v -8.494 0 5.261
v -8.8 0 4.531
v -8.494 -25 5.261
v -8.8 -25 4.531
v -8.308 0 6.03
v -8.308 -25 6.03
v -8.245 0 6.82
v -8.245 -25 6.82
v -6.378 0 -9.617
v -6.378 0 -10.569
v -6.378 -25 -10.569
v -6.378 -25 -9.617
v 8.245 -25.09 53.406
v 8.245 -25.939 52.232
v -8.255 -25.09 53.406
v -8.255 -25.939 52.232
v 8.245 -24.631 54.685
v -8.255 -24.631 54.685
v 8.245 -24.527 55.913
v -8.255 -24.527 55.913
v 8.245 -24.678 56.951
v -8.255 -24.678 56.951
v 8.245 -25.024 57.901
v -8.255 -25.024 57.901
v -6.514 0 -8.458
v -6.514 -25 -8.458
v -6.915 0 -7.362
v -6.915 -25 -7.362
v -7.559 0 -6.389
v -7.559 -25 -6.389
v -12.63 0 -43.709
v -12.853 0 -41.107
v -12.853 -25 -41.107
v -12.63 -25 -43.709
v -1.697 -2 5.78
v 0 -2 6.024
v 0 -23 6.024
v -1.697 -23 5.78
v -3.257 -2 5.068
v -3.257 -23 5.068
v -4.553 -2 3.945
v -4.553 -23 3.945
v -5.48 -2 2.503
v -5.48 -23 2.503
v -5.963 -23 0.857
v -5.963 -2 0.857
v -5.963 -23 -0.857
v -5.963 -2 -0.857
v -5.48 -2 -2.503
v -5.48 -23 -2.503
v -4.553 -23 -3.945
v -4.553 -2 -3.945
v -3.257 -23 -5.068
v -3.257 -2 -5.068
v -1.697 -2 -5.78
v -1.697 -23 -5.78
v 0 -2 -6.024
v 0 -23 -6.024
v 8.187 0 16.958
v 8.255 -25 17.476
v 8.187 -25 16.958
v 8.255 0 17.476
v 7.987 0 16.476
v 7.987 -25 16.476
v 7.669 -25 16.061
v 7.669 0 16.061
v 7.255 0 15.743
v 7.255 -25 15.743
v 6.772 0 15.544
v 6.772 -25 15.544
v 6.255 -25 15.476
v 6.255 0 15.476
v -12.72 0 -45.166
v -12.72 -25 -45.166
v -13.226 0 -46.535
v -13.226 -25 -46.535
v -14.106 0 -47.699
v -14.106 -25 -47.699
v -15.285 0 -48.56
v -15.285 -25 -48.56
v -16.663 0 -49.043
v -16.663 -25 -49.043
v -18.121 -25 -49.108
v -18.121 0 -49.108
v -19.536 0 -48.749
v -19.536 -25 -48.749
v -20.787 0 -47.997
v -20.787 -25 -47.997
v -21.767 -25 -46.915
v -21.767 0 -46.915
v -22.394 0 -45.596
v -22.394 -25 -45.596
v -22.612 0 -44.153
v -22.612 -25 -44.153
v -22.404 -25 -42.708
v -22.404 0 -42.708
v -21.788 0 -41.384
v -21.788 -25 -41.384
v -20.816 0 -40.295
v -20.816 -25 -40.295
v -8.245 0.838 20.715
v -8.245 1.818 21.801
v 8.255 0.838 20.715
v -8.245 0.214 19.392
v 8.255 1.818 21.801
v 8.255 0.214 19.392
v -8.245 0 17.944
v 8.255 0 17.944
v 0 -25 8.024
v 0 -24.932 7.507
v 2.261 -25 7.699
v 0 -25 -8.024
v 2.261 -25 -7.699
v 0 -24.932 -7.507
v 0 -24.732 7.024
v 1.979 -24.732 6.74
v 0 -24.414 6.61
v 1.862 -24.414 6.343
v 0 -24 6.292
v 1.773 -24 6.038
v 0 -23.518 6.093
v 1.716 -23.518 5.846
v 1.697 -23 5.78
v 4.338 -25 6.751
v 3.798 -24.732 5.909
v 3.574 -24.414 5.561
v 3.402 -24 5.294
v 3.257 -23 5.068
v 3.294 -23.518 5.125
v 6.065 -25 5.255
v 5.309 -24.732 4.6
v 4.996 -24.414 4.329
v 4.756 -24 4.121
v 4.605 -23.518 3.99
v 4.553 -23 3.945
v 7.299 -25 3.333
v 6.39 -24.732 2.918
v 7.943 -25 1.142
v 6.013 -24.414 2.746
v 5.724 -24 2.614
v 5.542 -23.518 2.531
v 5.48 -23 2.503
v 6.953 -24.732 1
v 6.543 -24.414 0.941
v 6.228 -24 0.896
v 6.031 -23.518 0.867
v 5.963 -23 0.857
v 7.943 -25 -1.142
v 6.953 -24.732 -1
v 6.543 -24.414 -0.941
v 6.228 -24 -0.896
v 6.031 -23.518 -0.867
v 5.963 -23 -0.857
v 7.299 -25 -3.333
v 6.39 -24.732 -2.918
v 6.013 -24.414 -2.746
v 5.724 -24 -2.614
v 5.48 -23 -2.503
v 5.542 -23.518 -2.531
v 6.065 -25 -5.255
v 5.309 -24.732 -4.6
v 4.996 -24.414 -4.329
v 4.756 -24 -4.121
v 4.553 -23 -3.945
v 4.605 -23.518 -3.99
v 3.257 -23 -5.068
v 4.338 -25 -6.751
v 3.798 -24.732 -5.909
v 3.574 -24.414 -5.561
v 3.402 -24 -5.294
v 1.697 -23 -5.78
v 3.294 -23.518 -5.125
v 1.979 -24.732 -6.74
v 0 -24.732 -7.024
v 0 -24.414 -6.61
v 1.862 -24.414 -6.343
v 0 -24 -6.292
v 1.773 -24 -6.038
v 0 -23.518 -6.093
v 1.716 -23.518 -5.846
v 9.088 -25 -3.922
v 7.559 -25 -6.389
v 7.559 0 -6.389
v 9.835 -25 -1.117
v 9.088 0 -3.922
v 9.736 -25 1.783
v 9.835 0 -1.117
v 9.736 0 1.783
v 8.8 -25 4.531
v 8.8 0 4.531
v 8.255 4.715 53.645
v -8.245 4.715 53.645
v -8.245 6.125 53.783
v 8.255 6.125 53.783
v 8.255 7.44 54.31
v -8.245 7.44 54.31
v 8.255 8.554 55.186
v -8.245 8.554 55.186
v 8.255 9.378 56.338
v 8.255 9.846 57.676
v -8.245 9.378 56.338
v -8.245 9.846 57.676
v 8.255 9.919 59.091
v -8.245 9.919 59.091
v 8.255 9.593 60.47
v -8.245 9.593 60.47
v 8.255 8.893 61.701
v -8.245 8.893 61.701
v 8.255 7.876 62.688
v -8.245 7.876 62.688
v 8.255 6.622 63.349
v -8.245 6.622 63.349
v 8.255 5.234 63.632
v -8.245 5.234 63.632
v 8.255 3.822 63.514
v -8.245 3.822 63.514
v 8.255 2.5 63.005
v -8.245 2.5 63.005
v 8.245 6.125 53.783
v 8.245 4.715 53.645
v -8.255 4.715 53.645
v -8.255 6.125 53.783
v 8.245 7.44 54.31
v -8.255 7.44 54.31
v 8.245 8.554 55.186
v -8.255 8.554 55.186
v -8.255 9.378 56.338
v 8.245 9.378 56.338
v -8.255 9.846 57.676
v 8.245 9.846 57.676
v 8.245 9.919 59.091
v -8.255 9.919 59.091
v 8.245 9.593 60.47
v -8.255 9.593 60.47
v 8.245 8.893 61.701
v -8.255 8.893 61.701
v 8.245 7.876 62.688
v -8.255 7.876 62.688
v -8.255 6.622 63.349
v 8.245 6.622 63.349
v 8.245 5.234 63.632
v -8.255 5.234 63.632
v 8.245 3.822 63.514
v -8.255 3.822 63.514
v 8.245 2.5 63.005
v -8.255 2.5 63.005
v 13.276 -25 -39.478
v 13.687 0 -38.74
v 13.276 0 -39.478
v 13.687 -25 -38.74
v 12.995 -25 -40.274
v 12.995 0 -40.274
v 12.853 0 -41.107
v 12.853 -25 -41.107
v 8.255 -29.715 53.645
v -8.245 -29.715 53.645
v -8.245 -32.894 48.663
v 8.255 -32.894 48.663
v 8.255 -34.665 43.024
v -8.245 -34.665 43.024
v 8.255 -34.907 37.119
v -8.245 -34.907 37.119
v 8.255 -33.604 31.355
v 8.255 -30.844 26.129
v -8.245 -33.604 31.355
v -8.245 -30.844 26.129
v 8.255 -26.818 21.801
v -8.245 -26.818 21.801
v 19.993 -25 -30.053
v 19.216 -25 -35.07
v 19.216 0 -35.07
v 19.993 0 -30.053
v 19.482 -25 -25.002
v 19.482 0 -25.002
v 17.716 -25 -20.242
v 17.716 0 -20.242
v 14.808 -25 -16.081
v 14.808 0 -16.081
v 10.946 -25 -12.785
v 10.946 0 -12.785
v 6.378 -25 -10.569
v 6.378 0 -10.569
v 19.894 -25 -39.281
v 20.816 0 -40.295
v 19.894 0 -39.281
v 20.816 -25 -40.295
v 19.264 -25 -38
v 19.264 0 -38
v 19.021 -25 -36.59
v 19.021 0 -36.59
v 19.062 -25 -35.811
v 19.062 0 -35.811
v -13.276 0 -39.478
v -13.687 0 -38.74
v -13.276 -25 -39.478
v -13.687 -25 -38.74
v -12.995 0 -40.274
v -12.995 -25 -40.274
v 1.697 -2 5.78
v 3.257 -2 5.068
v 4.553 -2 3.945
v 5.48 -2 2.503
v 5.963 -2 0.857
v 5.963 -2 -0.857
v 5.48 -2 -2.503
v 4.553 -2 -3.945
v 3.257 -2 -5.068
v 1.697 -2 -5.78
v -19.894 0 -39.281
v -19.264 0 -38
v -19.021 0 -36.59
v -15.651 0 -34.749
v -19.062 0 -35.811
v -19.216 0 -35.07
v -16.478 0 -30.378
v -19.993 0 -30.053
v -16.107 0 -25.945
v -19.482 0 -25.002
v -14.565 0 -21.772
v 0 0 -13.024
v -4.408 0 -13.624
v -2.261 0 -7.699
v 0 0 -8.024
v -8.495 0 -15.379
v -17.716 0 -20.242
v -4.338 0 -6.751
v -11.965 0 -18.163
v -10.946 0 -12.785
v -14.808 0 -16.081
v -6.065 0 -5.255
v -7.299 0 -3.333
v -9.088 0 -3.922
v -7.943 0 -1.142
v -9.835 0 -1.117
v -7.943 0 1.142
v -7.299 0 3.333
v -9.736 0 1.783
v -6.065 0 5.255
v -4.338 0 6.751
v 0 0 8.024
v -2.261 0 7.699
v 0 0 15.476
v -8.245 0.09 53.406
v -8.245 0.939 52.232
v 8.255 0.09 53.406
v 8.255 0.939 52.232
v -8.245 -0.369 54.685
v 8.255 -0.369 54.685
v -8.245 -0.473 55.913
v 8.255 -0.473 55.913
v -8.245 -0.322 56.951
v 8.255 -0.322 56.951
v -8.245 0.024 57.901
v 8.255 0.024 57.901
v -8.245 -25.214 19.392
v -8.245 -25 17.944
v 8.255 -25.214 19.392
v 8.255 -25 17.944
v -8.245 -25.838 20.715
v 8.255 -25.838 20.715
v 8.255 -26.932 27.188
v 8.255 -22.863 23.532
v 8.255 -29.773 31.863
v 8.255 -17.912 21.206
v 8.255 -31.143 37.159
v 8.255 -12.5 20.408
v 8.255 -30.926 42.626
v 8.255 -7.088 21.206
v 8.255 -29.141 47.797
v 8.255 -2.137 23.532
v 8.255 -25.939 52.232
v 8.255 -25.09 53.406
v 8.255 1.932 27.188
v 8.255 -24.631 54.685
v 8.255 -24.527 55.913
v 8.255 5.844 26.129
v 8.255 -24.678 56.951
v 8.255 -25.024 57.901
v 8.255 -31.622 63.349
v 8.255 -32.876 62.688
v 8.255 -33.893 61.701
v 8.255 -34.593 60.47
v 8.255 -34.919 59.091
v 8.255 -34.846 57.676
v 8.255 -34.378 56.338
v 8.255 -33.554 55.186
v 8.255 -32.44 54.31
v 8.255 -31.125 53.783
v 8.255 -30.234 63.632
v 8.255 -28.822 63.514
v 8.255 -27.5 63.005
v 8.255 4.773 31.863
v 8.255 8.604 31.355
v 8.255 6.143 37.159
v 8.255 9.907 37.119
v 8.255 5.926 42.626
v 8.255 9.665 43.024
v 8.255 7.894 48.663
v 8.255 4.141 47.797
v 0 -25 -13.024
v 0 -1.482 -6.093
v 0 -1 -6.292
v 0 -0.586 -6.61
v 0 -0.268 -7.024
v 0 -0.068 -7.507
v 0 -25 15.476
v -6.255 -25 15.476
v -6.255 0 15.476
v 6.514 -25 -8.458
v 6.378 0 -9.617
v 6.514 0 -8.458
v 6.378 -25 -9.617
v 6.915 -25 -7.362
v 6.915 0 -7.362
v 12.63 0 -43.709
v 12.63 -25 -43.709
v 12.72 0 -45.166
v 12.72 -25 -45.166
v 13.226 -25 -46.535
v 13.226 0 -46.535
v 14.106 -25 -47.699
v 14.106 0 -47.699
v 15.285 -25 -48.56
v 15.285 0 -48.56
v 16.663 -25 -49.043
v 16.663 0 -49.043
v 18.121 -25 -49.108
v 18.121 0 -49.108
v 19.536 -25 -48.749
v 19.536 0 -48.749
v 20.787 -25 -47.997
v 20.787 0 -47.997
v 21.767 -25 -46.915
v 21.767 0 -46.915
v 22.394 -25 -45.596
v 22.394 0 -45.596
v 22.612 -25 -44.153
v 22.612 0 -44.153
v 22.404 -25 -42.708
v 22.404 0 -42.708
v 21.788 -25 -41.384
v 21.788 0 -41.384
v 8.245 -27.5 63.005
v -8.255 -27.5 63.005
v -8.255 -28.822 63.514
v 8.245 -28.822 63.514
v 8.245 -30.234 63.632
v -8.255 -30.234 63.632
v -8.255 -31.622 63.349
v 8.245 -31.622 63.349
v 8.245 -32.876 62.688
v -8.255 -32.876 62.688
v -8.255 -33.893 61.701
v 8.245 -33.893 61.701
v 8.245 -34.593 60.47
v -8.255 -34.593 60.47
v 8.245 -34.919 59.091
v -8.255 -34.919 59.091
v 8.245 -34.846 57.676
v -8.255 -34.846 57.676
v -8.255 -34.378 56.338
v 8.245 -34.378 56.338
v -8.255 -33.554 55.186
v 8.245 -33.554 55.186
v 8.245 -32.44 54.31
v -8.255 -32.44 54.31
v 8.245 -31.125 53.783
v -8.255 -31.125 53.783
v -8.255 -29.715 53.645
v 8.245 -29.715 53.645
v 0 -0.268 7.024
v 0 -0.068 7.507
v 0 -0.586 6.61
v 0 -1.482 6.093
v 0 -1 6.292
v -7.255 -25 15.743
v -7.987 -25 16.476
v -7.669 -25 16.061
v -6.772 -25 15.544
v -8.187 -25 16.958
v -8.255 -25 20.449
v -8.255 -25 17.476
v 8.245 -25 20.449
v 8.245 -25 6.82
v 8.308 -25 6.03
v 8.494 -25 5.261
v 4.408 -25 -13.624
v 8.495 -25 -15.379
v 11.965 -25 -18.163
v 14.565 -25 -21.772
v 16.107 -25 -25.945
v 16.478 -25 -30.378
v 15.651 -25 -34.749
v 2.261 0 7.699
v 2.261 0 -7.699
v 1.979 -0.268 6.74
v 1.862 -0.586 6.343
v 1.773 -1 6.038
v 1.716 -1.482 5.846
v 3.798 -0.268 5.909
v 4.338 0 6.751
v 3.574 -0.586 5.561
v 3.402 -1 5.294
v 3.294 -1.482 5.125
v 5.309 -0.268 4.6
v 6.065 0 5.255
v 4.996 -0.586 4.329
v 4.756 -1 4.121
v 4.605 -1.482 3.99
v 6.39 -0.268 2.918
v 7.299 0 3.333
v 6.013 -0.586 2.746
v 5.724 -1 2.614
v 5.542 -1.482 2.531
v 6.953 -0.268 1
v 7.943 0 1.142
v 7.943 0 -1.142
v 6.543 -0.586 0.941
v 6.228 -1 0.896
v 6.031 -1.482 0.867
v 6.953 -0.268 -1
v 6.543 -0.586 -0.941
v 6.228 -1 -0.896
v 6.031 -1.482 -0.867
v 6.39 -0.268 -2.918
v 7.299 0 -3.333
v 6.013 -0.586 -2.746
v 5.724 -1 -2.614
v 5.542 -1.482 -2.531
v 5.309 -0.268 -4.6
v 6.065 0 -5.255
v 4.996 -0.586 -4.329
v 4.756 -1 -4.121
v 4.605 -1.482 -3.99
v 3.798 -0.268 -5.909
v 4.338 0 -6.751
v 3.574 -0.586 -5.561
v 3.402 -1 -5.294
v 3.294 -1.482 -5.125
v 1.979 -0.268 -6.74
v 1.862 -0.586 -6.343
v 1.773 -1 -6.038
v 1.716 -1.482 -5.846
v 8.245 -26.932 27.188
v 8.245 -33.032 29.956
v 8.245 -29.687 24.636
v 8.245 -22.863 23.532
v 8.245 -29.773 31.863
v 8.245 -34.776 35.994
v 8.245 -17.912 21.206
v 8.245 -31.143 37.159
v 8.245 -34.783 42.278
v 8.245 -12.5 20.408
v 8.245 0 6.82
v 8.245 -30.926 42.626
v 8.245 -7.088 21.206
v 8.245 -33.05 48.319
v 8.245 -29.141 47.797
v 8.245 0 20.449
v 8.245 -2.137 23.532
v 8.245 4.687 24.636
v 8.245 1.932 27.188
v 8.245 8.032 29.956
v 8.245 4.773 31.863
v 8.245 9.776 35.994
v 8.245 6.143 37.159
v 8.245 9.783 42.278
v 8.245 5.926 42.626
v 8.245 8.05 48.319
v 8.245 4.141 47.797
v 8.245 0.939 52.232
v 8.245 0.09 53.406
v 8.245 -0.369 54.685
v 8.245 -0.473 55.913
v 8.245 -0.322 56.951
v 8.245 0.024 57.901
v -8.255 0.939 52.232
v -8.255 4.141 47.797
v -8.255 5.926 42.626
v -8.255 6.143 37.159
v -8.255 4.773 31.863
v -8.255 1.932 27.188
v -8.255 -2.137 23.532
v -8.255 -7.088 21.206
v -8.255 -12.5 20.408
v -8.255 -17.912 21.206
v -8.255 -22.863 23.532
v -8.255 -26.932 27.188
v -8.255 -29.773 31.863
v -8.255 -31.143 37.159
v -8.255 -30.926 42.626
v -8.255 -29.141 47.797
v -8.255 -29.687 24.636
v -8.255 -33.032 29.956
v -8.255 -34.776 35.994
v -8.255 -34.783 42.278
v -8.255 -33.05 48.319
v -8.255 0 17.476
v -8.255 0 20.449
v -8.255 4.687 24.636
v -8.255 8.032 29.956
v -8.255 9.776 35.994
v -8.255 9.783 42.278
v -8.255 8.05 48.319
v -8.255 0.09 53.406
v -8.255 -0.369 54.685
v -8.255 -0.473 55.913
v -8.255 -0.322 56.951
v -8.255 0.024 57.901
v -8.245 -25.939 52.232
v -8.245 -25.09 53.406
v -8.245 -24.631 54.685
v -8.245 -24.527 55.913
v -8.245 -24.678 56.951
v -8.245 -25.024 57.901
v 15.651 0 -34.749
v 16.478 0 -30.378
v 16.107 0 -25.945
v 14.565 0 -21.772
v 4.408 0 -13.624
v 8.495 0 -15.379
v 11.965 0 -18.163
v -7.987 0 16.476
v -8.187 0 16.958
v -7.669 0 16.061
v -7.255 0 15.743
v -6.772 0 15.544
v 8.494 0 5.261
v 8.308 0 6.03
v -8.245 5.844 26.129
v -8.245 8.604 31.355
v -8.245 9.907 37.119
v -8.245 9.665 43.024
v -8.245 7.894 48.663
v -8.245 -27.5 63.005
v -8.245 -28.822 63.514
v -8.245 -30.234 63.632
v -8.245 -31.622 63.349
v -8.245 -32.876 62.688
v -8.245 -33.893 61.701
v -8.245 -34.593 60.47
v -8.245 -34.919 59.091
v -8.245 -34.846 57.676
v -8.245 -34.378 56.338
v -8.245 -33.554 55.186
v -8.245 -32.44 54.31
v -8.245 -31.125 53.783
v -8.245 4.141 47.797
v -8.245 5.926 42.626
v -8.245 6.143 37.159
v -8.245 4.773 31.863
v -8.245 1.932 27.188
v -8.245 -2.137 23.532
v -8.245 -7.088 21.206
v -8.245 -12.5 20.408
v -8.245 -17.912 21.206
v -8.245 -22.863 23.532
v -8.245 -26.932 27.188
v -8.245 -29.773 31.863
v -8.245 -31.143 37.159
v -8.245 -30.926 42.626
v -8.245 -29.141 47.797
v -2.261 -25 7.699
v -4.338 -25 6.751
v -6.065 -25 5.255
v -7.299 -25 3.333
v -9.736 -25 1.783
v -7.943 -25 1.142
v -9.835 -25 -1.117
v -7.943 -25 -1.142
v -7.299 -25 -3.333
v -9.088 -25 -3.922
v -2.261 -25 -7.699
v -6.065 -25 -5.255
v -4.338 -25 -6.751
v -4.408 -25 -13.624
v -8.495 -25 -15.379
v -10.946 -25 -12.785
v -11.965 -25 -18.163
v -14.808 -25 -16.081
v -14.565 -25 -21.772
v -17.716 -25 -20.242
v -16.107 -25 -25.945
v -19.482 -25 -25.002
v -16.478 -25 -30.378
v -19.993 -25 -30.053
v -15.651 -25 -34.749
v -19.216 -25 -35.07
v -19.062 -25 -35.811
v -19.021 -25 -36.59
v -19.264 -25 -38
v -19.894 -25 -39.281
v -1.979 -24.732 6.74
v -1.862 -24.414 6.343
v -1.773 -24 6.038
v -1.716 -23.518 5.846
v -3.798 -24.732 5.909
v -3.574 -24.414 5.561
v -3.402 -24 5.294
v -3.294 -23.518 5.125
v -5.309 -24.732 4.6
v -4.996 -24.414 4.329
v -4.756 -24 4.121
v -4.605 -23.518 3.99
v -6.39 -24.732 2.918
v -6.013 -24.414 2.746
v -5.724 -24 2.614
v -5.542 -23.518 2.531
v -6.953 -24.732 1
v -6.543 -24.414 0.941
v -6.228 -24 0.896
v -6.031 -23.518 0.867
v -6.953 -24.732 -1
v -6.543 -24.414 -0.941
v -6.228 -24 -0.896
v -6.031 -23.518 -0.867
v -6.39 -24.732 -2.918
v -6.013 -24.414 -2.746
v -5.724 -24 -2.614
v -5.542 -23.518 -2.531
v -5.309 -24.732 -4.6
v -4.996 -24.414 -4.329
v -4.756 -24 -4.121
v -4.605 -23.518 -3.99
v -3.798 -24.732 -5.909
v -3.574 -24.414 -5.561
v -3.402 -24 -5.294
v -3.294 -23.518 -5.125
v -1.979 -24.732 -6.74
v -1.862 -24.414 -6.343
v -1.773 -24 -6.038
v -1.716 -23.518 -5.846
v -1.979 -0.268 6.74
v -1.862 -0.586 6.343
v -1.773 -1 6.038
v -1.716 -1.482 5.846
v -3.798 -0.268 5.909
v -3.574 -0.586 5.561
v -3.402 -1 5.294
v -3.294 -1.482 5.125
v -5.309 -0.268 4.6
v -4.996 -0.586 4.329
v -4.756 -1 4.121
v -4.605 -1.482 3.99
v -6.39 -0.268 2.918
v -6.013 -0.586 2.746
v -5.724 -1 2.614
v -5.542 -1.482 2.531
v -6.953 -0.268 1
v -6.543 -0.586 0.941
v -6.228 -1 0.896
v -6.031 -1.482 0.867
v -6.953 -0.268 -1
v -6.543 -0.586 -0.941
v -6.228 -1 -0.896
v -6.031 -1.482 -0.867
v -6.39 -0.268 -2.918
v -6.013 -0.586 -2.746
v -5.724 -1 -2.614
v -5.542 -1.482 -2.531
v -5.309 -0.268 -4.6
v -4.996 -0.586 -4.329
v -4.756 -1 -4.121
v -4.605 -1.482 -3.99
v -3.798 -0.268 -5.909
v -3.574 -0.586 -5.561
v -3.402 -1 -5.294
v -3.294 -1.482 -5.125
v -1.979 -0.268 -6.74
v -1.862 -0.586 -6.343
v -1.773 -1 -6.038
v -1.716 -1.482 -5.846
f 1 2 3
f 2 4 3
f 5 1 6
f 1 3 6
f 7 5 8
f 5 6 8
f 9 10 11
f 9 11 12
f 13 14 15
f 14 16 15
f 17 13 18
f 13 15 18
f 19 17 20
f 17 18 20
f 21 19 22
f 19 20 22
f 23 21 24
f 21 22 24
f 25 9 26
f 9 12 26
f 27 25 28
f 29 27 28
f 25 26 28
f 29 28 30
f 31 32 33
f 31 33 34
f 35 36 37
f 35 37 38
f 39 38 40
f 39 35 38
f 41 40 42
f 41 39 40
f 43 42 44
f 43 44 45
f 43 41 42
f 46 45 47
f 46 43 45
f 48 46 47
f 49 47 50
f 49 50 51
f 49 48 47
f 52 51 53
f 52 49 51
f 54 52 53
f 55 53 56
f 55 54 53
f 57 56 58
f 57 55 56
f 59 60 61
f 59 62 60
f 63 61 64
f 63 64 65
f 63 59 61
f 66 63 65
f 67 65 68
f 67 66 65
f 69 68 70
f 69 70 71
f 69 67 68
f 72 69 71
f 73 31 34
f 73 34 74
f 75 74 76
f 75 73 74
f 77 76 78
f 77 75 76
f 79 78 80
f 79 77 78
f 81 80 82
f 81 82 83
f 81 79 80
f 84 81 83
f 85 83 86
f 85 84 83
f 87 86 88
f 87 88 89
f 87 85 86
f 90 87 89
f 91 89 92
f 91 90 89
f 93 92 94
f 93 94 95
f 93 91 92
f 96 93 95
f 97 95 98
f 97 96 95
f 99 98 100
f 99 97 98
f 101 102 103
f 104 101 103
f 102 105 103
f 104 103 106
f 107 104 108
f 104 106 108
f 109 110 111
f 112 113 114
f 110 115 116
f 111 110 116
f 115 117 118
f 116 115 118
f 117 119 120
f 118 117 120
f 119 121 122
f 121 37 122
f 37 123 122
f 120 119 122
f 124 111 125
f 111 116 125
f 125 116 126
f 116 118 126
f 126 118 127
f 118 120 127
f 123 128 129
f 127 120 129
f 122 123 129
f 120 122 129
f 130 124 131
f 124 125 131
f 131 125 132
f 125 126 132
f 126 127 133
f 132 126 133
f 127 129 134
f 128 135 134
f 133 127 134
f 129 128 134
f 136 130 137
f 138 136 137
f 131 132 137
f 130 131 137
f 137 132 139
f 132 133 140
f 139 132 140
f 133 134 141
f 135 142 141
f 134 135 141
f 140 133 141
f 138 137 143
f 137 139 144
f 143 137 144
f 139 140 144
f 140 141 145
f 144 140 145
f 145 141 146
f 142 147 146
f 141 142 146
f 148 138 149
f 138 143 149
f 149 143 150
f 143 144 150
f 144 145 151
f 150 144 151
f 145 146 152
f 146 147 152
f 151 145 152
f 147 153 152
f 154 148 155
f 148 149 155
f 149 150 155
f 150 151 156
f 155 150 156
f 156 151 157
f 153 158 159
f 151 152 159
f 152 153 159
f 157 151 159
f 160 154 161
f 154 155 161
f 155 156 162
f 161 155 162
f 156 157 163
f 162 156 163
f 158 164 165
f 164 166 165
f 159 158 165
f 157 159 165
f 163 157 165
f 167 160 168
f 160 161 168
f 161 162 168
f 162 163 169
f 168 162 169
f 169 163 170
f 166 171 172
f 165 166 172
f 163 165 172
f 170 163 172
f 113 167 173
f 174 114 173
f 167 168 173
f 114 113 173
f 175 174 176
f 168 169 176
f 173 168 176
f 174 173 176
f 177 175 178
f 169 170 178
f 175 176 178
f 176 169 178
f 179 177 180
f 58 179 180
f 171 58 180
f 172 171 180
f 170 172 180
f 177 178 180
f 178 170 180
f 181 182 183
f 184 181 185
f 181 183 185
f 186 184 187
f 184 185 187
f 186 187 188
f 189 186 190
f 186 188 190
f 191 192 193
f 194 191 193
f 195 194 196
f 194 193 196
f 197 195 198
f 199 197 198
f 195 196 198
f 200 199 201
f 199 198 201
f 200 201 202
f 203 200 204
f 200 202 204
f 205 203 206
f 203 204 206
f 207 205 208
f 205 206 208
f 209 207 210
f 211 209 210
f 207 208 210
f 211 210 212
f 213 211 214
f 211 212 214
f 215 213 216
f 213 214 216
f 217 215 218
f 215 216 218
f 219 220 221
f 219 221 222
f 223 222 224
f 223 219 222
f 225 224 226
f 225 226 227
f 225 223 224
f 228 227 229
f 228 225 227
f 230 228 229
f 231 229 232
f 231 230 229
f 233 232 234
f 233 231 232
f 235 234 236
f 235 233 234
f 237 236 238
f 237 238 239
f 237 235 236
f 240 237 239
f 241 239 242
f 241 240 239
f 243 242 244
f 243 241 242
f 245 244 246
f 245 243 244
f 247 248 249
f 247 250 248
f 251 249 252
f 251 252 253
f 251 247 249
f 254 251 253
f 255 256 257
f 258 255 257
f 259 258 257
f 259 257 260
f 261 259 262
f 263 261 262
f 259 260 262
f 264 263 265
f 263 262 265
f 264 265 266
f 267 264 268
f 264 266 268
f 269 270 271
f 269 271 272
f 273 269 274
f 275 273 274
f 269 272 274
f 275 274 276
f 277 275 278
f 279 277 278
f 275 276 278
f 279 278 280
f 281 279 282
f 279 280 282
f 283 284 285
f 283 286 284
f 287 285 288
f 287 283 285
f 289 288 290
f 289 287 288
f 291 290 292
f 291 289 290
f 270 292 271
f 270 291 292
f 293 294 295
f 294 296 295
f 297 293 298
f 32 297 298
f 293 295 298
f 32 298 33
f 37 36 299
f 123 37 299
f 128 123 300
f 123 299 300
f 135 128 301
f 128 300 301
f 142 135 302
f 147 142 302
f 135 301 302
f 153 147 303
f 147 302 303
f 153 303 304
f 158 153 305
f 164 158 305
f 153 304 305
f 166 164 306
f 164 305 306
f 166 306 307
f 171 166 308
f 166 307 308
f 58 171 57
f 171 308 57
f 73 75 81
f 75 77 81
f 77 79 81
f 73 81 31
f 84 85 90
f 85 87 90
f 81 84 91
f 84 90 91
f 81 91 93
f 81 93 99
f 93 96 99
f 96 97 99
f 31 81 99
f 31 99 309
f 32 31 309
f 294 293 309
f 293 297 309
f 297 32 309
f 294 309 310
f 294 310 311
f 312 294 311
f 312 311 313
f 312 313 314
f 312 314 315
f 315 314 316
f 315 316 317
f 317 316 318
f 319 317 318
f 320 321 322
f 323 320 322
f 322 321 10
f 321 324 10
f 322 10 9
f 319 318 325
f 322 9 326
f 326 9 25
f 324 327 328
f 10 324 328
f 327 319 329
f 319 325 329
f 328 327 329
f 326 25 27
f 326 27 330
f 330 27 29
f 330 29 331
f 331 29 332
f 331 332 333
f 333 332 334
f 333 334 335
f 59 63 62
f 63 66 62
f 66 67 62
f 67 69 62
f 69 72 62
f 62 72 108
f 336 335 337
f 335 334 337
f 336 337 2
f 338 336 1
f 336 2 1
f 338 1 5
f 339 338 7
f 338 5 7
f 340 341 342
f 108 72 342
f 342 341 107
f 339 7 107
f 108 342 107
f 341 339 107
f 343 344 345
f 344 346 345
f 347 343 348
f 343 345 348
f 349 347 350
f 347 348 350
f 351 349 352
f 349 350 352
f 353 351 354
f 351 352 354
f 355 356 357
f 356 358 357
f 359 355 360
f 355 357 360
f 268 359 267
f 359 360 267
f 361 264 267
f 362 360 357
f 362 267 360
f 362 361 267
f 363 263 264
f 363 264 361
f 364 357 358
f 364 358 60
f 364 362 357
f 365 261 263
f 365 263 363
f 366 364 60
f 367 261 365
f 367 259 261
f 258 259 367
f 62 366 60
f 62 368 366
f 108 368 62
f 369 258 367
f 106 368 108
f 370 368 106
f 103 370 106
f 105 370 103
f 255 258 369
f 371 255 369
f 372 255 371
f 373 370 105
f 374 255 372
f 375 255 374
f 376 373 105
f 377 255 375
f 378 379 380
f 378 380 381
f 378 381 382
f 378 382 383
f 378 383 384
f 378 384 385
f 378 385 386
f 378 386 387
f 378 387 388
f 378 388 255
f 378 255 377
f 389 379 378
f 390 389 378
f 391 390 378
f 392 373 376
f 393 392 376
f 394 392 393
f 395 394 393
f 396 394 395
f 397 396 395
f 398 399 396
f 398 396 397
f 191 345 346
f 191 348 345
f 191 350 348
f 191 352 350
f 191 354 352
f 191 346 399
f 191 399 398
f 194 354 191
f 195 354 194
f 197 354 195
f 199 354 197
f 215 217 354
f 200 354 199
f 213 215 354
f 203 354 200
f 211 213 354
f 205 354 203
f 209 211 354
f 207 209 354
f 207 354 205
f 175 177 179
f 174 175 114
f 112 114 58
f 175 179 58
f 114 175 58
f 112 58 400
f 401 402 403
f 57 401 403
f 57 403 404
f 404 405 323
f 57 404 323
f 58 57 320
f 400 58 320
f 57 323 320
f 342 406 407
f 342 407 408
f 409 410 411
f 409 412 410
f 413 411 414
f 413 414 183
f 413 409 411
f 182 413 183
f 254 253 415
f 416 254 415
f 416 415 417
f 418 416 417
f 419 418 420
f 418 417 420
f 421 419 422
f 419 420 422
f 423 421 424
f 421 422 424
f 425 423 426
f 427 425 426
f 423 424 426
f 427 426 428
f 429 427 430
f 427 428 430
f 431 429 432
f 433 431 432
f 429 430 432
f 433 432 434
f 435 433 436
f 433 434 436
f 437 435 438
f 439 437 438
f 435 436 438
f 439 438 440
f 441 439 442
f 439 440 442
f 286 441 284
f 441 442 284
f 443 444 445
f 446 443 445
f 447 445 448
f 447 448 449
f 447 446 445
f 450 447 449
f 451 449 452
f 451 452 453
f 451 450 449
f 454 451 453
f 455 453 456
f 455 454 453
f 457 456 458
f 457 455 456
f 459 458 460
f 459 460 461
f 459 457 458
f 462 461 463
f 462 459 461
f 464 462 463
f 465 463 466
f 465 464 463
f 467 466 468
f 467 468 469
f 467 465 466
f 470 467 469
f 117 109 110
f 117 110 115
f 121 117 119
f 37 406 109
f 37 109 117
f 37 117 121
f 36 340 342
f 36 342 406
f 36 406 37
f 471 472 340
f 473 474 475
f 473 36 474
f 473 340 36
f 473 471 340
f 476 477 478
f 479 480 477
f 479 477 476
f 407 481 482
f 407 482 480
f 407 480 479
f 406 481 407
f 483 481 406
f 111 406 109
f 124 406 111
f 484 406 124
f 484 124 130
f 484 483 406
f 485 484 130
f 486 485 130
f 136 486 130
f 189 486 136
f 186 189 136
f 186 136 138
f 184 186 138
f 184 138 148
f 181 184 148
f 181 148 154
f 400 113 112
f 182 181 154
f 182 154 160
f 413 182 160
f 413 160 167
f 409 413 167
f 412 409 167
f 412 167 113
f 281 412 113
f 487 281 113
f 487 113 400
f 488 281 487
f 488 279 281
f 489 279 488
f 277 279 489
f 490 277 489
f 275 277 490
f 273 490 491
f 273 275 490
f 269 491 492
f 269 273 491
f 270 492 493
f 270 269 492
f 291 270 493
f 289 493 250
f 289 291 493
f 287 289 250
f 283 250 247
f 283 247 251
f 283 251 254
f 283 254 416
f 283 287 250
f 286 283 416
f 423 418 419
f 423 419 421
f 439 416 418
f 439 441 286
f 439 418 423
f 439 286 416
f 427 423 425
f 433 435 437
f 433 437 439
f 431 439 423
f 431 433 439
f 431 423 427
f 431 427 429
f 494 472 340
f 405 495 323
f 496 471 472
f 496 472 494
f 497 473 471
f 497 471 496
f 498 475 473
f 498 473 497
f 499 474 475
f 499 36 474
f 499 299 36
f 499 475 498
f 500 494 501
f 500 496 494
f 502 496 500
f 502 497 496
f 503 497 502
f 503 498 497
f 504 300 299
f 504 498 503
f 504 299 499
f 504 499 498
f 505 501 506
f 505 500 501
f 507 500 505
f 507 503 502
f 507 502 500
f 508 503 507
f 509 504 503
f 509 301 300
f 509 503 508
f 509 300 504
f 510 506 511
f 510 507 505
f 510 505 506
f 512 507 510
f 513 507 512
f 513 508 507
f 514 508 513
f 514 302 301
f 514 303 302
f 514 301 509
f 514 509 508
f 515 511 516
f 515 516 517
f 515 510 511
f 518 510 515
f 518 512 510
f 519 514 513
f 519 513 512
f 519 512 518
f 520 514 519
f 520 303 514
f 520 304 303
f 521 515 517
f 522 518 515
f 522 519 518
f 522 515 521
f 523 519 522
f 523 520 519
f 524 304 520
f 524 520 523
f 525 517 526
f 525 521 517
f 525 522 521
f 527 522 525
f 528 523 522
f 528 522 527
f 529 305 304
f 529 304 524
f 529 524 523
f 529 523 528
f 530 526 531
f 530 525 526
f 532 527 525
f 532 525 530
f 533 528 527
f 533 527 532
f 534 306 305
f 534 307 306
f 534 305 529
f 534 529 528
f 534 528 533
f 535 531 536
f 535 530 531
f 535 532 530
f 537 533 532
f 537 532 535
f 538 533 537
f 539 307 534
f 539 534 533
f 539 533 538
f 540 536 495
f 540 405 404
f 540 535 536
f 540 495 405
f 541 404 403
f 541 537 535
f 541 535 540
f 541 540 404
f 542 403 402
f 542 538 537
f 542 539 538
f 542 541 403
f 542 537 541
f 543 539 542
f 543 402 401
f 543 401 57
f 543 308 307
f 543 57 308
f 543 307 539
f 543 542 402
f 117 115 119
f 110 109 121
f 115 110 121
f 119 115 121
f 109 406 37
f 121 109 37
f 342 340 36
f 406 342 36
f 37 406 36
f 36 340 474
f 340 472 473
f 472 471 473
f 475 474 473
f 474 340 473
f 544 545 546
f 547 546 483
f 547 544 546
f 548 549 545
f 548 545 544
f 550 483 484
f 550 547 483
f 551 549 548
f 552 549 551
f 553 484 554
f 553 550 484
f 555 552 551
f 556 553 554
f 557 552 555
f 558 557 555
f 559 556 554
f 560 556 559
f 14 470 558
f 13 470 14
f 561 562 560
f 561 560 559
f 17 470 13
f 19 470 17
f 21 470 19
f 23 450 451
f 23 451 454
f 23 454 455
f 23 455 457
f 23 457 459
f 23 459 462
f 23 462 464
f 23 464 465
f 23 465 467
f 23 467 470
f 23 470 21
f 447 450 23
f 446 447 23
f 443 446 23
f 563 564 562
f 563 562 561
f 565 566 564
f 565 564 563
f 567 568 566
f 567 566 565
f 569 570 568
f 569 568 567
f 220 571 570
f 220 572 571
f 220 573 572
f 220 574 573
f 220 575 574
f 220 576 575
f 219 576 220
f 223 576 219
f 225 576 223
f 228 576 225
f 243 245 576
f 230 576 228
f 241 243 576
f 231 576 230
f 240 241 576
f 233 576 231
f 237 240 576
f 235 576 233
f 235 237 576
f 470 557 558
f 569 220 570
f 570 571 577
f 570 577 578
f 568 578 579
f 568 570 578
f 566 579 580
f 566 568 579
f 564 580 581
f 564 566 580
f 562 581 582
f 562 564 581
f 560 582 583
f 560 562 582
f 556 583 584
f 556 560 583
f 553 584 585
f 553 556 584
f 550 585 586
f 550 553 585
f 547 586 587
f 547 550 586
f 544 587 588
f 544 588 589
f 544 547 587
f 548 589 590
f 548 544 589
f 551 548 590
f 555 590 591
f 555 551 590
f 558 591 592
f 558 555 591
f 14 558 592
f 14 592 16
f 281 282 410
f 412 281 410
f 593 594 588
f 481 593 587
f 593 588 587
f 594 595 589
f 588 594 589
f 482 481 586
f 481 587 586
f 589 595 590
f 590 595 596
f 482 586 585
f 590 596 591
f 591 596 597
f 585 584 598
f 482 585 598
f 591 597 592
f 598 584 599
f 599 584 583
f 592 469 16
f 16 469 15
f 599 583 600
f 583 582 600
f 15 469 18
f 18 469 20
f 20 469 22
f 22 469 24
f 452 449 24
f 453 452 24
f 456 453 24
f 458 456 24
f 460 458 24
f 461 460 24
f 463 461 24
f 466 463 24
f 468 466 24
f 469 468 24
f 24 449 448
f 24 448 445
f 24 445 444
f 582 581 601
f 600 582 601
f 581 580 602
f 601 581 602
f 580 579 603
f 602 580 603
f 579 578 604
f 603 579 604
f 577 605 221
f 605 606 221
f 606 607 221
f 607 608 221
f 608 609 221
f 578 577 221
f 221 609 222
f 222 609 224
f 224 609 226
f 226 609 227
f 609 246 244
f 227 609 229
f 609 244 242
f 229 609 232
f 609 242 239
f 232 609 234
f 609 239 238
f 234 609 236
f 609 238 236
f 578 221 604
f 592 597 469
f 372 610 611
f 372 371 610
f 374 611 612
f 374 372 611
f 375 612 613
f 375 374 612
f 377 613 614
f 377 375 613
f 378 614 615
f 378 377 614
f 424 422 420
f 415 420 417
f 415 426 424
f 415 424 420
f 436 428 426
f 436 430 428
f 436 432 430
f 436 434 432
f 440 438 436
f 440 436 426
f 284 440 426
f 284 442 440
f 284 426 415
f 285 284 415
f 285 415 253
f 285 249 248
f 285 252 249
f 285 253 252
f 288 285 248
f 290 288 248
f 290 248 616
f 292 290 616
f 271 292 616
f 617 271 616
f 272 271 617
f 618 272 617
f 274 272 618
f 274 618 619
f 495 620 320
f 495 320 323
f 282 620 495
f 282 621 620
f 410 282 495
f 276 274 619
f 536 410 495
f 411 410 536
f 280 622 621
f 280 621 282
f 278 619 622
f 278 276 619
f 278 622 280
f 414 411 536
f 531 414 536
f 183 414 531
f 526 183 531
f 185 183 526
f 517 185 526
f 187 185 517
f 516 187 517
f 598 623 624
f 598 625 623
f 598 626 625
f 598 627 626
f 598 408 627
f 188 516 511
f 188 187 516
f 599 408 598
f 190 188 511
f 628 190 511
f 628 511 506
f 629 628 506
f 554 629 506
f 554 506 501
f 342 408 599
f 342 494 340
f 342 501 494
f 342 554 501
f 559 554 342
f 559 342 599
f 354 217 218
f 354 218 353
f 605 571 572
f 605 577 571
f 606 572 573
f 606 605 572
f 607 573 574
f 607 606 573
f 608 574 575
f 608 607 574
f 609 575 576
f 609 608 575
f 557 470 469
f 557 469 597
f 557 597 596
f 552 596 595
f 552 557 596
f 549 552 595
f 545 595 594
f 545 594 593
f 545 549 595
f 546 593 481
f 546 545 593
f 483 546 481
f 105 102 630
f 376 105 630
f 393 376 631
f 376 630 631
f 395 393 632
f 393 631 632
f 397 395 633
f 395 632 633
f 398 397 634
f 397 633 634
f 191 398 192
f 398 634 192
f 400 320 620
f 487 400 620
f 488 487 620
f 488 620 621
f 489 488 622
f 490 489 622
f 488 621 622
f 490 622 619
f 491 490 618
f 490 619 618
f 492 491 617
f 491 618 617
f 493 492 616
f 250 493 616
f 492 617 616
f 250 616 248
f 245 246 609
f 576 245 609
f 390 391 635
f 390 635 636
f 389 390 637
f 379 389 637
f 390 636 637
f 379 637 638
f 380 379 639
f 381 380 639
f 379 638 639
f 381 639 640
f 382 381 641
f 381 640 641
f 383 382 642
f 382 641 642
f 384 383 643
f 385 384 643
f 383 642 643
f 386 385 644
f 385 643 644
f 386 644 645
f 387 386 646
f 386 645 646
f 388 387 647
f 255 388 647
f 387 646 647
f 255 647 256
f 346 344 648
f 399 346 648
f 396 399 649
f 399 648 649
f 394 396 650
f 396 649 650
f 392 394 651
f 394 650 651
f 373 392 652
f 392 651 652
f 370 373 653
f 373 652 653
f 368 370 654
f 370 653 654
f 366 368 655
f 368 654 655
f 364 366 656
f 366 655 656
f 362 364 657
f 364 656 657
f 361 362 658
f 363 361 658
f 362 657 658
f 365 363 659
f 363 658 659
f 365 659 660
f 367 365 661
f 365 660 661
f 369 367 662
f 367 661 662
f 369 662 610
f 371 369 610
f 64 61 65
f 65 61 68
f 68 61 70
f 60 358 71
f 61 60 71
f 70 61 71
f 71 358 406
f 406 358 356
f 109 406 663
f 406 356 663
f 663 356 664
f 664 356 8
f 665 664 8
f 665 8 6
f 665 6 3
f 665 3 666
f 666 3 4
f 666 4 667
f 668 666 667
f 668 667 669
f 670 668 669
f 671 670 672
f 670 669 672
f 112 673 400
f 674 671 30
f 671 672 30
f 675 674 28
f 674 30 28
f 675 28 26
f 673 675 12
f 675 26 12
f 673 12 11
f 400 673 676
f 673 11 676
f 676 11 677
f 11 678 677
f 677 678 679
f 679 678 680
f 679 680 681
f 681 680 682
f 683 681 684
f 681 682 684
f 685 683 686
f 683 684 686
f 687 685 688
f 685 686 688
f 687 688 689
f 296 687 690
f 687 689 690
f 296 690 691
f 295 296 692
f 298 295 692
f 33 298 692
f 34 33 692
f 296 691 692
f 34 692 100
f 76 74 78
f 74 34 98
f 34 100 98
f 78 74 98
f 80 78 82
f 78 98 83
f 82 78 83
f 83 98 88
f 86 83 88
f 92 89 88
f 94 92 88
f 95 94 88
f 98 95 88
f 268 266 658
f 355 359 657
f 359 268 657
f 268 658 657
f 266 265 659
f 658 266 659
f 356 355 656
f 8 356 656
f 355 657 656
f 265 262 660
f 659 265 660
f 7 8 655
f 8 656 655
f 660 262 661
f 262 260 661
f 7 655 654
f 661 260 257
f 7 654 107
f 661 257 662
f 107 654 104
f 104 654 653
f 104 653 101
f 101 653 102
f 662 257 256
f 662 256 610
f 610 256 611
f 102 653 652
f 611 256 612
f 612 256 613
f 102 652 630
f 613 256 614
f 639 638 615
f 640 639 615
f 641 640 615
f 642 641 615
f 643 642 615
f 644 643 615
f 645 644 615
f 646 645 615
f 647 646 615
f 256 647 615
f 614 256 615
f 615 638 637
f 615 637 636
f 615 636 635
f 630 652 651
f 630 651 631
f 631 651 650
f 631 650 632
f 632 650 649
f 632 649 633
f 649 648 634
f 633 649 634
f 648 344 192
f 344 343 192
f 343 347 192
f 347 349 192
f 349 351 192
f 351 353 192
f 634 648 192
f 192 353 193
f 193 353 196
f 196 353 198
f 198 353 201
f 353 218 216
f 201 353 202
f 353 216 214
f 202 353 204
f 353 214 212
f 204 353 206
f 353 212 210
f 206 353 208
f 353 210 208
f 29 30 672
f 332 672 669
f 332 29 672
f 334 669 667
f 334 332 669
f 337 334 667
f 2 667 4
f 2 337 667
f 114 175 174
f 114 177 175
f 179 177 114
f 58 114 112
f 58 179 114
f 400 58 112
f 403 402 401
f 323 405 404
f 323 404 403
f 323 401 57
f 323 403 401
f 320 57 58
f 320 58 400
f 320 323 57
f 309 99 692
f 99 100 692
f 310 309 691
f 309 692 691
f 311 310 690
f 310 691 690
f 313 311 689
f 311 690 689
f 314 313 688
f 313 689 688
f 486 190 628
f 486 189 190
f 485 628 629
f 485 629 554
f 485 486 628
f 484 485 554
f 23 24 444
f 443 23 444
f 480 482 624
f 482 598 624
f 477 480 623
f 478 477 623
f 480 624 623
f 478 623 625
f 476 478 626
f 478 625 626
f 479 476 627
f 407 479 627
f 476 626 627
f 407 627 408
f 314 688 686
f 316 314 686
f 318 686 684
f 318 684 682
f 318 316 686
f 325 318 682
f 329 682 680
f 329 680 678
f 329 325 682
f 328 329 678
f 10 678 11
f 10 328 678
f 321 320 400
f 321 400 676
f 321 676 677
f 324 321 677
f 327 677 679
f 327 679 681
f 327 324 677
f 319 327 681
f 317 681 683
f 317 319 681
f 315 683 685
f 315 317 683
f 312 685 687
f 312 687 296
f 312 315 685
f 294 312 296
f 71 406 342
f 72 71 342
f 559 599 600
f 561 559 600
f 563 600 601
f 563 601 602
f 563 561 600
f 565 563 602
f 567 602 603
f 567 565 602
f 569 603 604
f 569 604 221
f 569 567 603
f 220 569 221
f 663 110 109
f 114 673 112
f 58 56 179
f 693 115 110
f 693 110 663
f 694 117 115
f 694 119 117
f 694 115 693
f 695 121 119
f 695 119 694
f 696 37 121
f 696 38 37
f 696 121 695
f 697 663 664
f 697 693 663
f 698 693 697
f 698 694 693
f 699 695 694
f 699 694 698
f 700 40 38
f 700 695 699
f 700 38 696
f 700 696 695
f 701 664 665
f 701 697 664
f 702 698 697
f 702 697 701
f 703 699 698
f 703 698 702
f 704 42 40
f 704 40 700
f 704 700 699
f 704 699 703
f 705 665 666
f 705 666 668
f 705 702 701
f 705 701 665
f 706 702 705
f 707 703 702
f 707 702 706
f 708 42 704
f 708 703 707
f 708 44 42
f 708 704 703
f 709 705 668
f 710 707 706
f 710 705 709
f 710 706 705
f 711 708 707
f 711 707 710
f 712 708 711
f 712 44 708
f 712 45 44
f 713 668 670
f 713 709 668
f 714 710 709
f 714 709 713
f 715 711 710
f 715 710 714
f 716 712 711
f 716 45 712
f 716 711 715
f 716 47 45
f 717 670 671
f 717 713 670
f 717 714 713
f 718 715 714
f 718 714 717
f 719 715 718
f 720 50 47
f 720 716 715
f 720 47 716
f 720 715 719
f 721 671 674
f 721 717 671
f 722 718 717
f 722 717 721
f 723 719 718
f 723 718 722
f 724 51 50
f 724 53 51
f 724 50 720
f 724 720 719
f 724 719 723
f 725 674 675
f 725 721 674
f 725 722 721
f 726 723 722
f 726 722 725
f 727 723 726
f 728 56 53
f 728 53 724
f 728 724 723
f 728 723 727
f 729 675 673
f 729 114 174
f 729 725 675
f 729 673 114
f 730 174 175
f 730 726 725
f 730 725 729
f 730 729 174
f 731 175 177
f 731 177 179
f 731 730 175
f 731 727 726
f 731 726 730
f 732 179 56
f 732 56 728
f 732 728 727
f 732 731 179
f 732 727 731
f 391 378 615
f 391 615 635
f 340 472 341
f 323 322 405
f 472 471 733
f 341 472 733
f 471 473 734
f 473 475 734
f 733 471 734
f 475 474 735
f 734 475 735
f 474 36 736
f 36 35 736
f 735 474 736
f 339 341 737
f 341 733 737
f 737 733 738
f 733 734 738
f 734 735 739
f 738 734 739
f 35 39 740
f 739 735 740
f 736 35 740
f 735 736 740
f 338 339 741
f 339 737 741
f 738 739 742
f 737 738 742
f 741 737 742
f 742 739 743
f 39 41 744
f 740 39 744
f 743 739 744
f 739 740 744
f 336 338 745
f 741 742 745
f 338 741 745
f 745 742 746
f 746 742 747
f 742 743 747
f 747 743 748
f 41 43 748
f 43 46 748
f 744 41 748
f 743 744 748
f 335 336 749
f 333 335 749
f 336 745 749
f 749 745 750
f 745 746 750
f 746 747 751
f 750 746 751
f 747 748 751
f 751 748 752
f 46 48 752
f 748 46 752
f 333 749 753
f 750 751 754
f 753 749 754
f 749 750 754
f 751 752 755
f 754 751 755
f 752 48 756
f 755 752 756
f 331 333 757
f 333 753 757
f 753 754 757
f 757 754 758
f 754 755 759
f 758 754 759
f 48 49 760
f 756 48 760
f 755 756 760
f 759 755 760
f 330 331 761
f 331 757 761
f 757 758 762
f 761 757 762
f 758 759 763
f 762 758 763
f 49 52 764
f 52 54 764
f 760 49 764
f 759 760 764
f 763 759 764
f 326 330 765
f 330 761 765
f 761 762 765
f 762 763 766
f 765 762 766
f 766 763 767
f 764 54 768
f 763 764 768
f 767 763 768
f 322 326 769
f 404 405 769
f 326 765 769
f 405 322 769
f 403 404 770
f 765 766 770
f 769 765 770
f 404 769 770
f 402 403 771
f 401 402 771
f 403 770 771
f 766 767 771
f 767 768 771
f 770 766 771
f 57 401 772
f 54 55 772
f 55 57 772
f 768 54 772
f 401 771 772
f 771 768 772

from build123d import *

# Parameters (mm, degrees)
F1_DEPTH = 25
F3_DEPTH = 16.5
F5_R     = 5
F5_2_R   = 5
F6_R     = 2
F6_2_R   = 2


with BuildPart() as f1:
    # F0 (on Front) → F1 (new body)
    with BuildSketch(Plane.XZ):
        with BuildLine():
            ThreePointArc((0, -13.0244963626), (14.841258851, -22.3142927791), (12.9707270003, -39.7230374879))
            Line((12.9707270003, -39.7230374879), (12.6301857194, -43.7085150799))
            ThreePointArc((12.6301857194, -43.7085150799), (21.0202444261, -47.7926193342), (17.539775381, -39.1347138203))
            ThreePointArc((17.539775381, -39.1347138203), (18.6284646808, -22.2457393509), (6.3781159631, -10.5687680263))
            Line((6.3781159631, -10.5687680263), (6.3781159631, -7.5687680263))
            ThreePointArc((6.3781159631, -7.5687680263), (9.7979360751, -1.4025196408), (8.2453303507, 5.4755036374))
            Line((8.2453303507, 5.4755036374), (8.2453303507, 15.4755036374))
            Line((8.2453303507, 15.4755036374), (0, 15.4755036374))
            Line((0, 15.4755036374), (0, 6.0244963626))
            ThreePointArc((0, 6.0244963626), (6.0244963626, 0), (0, -6.0244963626))
            Line((0, -6.0244963626), (0, -13.0244963626))
        make_face()
    extrude(amount=F1_DEPTH)

    # F2 (on face) → F3 (join)
    with BuildSketch(Plane.YZ.offset(8.2453303507)):
        with BuildLine():
            ThreePointArc((-1.6496046584, 54.4491597502), (-12.5, 20.4076123815), (-23.3503953416, 54.4491597502))
            Line((-23.3503953416, 54.4491597502), (-25.001859694, 57.8541294423))
            Line((-25.001859694, 57.8541294423), (-25.0057154727, 57.8620792414))
            Line((-25.0057154727, 57.8620792414), (-27.5, 63.0047656136))
            ThreePointArc((-27.5, 63.0047656136), (-34.8052642949, 59.7918207884), (-29.7149281613, 53.6454089151))
            ThreePointArc((-29.7149281613, 53.6454089151), (-34.7764276378, 35.993632025), (-25, 20.4493254476))
            Line((-25, 20.4493254476), (-25, 15.4755036374))
            Line((-25, 15.4755036374), (0, 15.4755036374))
            Line((0, 15.4755036374), (0, 20.4493254476))
            ThreePointArc((0, 20.4493254476), (9.7764276378, 35.993632025), (4.7149281613, 53.6454089151))
            ThreePointArc((4.7149281613, 53.6454089151), (9.8052642949, 59.7918207884), (2.5, 63.0047656136))
            Line((2.5, 63.0047656136), (0.0057154727, 57.8620792414))
            Line((0.0057154727, 57.8620792414), (0.001859694, 57.8541294423))
            Line((0.001859694, 57.8541294423), (-1.6496046584, 54.4491597502))
        make_face()
    extrude(amount=-F3_DEPTH)


with BuildPart() as f4_1:
    # F4: instance of F1
    add(f1.part.mirror(Plane.YZ))

    # F5#2
    f5_2_edges = [f4_1.edges().sort_by_distance(p)[0] for p in [
        (-12.970727, -12.5, -39.723037),
        (-17.539775, -12.5, -39.134714),
        (-8.24533, -12.5, 5.475504),
        (-6.378116, -12.5, -7.568768),
        (0.00467, 0, 20.449325),
        (0.00467, -25, 20.449325),
        (0.00467, -1.649605, 54.44916),
        (0.00467, -23.350395, 54.44916),
    ]]
    fillet(f5_2_edges, radius=F5_2_R)

    # F6#2
    f6_2_edges = [f4_1.edges().sort_by_distance(p)[0] for p in [
        (-6.024496, -25, 0),
        (-6.024496, 0, 0),
        (8.25467, -12.5, 15.475504),
    ]]
    fillet(f6_2_edges, radius=F6_2_R)


with BuildPart() as f1_1:
    add(f1.part)

    # F5
    f5_edges = [f1_1.edges().sort_by_distance(p)[0] for p in [
        (12.970727, -12.5, -39.723037),
        (17.539775, -12.5, -39.134714),
        (8.24533, -12.5, 5.475504),
        (6.378116, -12.5, -7.568768),
        (-0.00467, -1.649605, 54.44916),
        (-0.00467, -23.350395, 54.44916),
    ]]
    fillet(f5_edges, radius=F5_R)

    # F6
    f6_edges = [f1_1.edges().sort_by_distance(p)[0] for p in [
        (6.024496, -25, 0),
        (6.024496, 0, 0),
        (-8.25467, -12.5, 15.475504),
    ]]
    fillet(f6_edges, radius=F6_R)


solid = Compound([f4_1.part, f1_1.part])
